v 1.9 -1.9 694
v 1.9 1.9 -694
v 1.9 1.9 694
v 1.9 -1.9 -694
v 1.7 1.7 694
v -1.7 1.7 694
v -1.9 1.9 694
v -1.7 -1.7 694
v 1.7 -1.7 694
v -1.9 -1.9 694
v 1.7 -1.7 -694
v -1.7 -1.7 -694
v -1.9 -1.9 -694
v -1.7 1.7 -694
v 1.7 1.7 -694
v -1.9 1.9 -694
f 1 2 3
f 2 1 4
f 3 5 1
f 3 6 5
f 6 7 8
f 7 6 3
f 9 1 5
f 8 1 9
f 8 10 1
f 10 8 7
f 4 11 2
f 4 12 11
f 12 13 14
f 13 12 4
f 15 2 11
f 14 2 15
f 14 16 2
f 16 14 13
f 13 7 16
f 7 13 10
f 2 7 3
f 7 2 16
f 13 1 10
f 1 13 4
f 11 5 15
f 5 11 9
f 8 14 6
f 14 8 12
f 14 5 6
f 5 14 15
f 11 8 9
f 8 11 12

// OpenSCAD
// file: parameters.scad
//parameters file para heliostatico Amo-Esclavo

//rin
rinRadus=60;
rinAncho=5;
rinGruesoMetal=.5;
rinAltura=5;

//hub
hubRodius=10;
hubAncho=14;
hubGrueso=.8;
hubAltura=4;

//fork


//forkCableGuide


//headTube
headTubeMountPlateAncho=15;
headTubeMountPlateAlta=15;


//mountPlate


//rackTube
rackTubeAlta=3.8;
rackTubeAncho=3.8;
rackTubeGrueso=.2;
rackTubeLarga=1388;

//rackFoot
rackFootAlta=10;
rackFootAncho=10;
rackFootGrueso=0.35;
// main file
include<parameters.scad>;
//rackTube

innerAlta=rackTubeAlta-2*rackTubeGrueso;
innerAncho=rackTubeAncho-2*rackTubeGrueso;

difference() {
cube([rackTubeAlta, rackTubeAncho, rackTubeLarga], center=true);
cube([innerAlta,innerAncho, rackTubeLarga*1.1], center=true); };	
